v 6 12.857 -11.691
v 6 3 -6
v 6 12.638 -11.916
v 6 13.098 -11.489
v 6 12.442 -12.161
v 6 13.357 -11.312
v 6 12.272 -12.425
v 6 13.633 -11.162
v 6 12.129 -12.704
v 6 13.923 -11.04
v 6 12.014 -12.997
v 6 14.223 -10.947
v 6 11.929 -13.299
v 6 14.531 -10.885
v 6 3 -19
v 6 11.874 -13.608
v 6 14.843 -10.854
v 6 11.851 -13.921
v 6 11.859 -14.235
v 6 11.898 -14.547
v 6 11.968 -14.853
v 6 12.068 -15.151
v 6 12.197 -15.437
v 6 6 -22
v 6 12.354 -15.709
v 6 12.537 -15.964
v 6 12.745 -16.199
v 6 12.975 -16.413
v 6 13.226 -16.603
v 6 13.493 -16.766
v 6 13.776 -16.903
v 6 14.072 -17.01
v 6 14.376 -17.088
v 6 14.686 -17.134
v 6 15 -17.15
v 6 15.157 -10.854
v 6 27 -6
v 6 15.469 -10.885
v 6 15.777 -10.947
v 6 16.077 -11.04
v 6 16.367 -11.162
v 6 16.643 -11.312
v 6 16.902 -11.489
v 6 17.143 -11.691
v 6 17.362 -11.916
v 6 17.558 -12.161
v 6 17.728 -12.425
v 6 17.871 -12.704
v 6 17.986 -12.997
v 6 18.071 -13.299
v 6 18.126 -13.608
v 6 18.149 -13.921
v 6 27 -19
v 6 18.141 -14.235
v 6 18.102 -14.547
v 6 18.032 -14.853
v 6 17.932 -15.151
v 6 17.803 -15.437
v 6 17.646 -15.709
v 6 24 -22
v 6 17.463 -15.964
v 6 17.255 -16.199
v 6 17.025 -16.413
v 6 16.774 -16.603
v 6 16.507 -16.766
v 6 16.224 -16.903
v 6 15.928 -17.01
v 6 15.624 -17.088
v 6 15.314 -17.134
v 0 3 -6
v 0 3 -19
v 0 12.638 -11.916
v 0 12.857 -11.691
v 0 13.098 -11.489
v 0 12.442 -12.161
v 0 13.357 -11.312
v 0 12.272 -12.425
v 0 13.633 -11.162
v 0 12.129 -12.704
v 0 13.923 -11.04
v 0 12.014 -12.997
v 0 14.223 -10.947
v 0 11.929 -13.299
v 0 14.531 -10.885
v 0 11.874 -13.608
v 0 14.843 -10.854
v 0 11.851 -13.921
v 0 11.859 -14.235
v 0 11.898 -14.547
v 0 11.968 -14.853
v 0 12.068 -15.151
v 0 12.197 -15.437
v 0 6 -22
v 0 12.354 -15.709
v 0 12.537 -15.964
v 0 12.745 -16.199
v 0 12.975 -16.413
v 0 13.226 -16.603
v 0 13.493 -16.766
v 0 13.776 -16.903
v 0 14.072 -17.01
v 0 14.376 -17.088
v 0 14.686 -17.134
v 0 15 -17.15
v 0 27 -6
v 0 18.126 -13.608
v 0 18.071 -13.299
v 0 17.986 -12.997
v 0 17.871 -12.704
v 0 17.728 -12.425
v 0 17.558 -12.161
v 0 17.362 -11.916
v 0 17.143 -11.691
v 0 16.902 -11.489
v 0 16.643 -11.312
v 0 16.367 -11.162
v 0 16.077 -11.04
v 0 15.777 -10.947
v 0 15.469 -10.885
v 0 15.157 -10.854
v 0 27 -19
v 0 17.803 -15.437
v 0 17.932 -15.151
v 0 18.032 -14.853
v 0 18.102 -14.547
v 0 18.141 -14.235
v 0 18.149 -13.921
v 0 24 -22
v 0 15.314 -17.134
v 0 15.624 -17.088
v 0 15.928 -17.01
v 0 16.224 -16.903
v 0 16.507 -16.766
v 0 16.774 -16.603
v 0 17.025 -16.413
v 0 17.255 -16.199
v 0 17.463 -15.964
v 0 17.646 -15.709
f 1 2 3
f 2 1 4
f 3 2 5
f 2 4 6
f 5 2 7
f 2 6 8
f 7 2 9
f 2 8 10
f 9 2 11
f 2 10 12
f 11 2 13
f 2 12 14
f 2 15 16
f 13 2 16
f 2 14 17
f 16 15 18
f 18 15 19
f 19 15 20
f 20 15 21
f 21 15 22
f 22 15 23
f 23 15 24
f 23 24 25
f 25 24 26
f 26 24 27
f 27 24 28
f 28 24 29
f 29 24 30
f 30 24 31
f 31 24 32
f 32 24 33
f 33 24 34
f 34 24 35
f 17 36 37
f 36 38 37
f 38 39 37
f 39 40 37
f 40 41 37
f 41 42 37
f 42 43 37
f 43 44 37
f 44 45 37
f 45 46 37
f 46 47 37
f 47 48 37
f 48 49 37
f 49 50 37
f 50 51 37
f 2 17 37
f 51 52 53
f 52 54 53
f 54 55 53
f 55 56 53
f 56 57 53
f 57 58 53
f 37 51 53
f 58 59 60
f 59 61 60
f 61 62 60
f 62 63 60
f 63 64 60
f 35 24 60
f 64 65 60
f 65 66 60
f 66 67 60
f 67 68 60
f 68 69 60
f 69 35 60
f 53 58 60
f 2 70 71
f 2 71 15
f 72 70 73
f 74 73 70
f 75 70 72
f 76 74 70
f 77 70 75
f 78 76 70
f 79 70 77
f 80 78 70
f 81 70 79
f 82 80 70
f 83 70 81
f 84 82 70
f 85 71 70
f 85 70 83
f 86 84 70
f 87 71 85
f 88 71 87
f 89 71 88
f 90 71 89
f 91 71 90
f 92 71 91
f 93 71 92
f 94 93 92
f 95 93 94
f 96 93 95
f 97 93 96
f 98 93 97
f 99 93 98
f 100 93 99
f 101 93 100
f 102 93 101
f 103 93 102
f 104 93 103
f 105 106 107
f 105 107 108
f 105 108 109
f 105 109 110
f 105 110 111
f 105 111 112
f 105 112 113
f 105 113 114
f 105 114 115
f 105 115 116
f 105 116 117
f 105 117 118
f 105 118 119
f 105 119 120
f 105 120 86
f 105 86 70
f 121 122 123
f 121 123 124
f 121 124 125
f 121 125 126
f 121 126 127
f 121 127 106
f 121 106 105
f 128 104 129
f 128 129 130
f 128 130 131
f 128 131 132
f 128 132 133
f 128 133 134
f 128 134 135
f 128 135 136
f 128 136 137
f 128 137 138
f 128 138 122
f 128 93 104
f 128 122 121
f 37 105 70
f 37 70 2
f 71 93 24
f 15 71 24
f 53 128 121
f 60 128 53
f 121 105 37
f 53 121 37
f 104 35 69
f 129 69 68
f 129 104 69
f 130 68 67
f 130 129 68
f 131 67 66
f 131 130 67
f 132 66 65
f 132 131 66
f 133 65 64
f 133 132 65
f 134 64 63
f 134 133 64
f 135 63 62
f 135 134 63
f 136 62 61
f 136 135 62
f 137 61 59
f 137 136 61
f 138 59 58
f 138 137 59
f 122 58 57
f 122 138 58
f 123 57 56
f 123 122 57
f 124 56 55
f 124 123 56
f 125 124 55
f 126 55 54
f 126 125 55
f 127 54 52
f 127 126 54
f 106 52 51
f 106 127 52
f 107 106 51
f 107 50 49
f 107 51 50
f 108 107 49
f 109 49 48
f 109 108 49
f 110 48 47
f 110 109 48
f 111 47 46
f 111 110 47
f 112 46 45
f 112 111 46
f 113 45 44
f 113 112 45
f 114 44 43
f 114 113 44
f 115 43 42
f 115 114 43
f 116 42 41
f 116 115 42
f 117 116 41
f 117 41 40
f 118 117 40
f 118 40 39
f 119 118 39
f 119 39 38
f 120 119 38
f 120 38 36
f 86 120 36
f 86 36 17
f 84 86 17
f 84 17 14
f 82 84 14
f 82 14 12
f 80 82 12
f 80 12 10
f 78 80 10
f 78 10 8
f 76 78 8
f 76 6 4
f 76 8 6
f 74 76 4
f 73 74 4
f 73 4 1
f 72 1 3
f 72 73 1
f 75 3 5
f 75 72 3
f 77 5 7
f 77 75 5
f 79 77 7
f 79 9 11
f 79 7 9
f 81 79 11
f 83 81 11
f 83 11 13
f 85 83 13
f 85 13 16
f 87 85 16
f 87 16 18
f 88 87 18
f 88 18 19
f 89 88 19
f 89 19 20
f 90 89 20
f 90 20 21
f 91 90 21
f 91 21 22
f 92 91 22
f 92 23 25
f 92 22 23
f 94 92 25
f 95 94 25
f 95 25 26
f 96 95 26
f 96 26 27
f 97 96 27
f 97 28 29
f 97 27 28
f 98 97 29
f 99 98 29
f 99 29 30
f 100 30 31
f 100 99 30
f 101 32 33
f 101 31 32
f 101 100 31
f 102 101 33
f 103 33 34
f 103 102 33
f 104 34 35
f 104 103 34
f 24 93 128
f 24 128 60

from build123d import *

# Parameters (mm, degrees)
CYLINDER_R         = 3.15
CYLINDER_DEPTH     = 13
BOX009_W           = 6
BOX009_H           = 24
BOX009_DEPTH       = 16
CHAMFER020020_SIZE = 3


with BuildPart() as cylinder:
    # Cylinder → Cylinder (new body)
    with BuildSketch(Plane(origin=(0, 15, -14), x_dir=(0, 0, -1), z_dir=(1, 0, 0))):
        Circle(CYLINDER_R)
    extrude(amount=CYLINDER_DEPTH)


with BuildPart() as cut002002002007004004001004:
    # Box009 → Box009 (new body)
    with BuildSketch(Plane(origin=(0, 3, -22), x_dir=(1, 0, 0), z_dir=(0, 0, 1))):
        with Locations((3, 12)):
            Rectangle(BOX009_W, BOX009_H)
    extrude(amount=BOX009_DEPTH)

    # Chamfer020020
    chamfer020020_edges = [cut002002002007004004001004.edges().sort_by_distance(p)[0] for p in [
        (3, 3, -22),
        (3, 27, -22),
    ]]
    chamfer(chamfer020020_edges, length=CHAMFER020020_SIZE)

    # Cut002002002007004004001004: cut Cylinder
    add(cylinder.part, mode=Mode.SUBTRACT)


solid = cut002002002007004004001004.part
